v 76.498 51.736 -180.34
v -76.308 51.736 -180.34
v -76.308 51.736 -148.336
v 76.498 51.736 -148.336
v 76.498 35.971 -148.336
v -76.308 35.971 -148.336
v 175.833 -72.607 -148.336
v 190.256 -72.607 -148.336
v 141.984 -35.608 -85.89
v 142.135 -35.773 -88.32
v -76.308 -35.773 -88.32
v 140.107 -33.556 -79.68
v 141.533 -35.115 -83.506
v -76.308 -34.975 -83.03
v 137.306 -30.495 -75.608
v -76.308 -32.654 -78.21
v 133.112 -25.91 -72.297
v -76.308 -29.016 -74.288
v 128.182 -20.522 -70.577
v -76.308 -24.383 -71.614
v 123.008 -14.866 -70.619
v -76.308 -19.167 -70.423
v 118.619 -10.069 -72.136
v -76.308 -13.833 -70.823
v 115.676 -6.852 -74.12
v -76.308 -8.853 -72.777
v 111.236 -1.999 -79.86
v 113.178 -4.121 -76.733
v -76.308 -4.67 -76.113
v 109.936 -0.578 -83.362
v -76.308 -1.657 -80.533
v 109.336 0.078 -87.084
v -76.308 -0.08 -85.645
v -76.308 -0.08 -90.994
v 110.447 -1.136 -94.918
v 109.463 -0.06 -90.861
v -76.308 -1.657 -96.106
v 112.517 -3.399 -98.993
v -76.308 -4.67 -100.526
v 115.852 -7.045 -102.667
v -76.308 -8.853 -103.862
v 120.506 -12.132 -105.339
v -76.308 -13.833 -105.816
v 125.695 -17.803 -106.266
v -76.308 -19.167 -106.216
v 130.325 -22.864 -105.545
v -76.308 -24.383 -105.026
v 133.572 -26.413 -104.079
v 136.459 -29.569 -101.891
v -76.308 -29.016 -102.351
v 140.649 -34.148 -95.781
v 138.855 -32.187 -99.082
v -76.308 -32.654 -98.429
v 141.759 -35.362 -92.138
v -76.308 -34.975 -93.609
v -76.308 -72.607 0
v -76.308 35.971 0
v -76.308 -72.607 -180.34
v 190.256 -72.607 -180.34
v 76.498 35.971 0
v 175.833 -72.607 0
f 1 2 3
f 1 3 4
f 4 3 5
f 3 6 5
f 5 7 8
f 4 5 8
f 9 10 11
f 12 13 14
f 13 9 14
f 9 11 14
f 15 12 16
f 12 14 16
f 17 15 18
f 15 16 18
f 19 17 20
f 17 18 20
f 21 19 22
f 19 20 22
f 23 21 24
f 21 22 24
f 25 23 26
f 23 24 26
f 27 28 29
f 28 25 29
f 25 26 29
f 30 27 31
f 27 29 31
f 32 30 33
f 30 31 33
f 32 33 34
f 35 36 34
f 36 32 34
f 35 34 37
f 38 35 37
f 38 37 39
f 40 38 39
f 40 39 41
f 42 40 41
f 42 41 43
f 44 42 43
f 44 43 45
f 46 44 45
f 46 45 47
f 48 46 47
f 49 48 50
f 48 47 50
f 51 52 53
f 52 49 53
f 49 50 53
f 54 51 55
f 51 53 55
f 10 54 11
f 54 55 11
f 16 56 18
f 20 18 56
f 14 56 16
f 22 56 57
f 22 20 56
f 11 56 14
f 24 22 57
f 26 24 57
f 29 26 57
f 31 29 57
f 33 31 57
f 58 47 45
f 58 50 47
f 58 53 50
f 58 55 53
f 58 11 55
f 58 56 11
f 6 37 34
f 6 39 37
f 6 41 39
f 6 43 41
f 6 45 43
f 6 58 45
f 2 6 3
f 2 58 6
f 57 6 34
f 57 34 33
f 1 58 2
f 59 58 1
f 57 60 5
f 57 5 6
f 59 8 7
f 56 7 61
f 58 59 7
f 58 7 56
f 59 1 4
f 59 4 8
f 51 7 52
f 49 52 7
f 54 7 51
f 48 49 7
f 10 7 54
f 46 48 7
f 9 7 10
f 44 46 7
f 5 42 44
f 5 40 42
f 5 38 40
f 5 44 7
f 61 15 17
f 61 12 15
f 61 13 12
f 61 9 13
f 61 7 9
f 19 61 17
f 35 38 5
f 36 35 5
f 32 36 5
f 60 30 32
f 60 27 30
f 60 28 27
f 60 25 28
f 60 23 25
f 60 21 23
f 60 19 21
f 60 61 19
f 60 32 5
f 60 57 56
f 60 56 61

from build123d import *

# Parameters (mm, degrees)
F1_DEPTH = 180.34
F3_DEPTH = 32.004
F4_R     = 17.946652
F5_DEPTH = 340.36


with BuildPart() as f1:
    # F0 (on Top) → F1 (new body)
    with BuildSketch(Plane.XY):
        Polygon((76.498292, 35.97128), (-76.308474, 35.97128), (-76.308474, -72.606944), (76.498292, -72.606944), (175.83324, -72.606944), align=None)
    extrude(amount=-F1_DEPTH)

    # F2 (on face) → F3 (join)
    with BuildSketch(Plane(origin=(0, 0, -180.34), x_dir=(1, 0, 0), z_dir=(0, 0, -1))):
        Polygon((-76.308474, -51.736325), (76.498292, -51.736325), (190.256205, 72.606944), (175.83324, 72.606944), (76.498292, -35.97128), (-76.308474, -35.97128), align=None)
    extrude(amount=-F3_DEPTH)

    # F4 (on face) → F5 (cut)
    with BuildSketch(Plane(origin=(-76.308474, 0, 0), x_dir=(0, -1, 0), z_dir=(-1, 0, 0))):
        with Locations((17.826151, -88.319629)):
            Circle(F4_R)
    extrude(amount=-F5_DEPTH, mode=Mode.SUBTRACT)


solid = f1.part
